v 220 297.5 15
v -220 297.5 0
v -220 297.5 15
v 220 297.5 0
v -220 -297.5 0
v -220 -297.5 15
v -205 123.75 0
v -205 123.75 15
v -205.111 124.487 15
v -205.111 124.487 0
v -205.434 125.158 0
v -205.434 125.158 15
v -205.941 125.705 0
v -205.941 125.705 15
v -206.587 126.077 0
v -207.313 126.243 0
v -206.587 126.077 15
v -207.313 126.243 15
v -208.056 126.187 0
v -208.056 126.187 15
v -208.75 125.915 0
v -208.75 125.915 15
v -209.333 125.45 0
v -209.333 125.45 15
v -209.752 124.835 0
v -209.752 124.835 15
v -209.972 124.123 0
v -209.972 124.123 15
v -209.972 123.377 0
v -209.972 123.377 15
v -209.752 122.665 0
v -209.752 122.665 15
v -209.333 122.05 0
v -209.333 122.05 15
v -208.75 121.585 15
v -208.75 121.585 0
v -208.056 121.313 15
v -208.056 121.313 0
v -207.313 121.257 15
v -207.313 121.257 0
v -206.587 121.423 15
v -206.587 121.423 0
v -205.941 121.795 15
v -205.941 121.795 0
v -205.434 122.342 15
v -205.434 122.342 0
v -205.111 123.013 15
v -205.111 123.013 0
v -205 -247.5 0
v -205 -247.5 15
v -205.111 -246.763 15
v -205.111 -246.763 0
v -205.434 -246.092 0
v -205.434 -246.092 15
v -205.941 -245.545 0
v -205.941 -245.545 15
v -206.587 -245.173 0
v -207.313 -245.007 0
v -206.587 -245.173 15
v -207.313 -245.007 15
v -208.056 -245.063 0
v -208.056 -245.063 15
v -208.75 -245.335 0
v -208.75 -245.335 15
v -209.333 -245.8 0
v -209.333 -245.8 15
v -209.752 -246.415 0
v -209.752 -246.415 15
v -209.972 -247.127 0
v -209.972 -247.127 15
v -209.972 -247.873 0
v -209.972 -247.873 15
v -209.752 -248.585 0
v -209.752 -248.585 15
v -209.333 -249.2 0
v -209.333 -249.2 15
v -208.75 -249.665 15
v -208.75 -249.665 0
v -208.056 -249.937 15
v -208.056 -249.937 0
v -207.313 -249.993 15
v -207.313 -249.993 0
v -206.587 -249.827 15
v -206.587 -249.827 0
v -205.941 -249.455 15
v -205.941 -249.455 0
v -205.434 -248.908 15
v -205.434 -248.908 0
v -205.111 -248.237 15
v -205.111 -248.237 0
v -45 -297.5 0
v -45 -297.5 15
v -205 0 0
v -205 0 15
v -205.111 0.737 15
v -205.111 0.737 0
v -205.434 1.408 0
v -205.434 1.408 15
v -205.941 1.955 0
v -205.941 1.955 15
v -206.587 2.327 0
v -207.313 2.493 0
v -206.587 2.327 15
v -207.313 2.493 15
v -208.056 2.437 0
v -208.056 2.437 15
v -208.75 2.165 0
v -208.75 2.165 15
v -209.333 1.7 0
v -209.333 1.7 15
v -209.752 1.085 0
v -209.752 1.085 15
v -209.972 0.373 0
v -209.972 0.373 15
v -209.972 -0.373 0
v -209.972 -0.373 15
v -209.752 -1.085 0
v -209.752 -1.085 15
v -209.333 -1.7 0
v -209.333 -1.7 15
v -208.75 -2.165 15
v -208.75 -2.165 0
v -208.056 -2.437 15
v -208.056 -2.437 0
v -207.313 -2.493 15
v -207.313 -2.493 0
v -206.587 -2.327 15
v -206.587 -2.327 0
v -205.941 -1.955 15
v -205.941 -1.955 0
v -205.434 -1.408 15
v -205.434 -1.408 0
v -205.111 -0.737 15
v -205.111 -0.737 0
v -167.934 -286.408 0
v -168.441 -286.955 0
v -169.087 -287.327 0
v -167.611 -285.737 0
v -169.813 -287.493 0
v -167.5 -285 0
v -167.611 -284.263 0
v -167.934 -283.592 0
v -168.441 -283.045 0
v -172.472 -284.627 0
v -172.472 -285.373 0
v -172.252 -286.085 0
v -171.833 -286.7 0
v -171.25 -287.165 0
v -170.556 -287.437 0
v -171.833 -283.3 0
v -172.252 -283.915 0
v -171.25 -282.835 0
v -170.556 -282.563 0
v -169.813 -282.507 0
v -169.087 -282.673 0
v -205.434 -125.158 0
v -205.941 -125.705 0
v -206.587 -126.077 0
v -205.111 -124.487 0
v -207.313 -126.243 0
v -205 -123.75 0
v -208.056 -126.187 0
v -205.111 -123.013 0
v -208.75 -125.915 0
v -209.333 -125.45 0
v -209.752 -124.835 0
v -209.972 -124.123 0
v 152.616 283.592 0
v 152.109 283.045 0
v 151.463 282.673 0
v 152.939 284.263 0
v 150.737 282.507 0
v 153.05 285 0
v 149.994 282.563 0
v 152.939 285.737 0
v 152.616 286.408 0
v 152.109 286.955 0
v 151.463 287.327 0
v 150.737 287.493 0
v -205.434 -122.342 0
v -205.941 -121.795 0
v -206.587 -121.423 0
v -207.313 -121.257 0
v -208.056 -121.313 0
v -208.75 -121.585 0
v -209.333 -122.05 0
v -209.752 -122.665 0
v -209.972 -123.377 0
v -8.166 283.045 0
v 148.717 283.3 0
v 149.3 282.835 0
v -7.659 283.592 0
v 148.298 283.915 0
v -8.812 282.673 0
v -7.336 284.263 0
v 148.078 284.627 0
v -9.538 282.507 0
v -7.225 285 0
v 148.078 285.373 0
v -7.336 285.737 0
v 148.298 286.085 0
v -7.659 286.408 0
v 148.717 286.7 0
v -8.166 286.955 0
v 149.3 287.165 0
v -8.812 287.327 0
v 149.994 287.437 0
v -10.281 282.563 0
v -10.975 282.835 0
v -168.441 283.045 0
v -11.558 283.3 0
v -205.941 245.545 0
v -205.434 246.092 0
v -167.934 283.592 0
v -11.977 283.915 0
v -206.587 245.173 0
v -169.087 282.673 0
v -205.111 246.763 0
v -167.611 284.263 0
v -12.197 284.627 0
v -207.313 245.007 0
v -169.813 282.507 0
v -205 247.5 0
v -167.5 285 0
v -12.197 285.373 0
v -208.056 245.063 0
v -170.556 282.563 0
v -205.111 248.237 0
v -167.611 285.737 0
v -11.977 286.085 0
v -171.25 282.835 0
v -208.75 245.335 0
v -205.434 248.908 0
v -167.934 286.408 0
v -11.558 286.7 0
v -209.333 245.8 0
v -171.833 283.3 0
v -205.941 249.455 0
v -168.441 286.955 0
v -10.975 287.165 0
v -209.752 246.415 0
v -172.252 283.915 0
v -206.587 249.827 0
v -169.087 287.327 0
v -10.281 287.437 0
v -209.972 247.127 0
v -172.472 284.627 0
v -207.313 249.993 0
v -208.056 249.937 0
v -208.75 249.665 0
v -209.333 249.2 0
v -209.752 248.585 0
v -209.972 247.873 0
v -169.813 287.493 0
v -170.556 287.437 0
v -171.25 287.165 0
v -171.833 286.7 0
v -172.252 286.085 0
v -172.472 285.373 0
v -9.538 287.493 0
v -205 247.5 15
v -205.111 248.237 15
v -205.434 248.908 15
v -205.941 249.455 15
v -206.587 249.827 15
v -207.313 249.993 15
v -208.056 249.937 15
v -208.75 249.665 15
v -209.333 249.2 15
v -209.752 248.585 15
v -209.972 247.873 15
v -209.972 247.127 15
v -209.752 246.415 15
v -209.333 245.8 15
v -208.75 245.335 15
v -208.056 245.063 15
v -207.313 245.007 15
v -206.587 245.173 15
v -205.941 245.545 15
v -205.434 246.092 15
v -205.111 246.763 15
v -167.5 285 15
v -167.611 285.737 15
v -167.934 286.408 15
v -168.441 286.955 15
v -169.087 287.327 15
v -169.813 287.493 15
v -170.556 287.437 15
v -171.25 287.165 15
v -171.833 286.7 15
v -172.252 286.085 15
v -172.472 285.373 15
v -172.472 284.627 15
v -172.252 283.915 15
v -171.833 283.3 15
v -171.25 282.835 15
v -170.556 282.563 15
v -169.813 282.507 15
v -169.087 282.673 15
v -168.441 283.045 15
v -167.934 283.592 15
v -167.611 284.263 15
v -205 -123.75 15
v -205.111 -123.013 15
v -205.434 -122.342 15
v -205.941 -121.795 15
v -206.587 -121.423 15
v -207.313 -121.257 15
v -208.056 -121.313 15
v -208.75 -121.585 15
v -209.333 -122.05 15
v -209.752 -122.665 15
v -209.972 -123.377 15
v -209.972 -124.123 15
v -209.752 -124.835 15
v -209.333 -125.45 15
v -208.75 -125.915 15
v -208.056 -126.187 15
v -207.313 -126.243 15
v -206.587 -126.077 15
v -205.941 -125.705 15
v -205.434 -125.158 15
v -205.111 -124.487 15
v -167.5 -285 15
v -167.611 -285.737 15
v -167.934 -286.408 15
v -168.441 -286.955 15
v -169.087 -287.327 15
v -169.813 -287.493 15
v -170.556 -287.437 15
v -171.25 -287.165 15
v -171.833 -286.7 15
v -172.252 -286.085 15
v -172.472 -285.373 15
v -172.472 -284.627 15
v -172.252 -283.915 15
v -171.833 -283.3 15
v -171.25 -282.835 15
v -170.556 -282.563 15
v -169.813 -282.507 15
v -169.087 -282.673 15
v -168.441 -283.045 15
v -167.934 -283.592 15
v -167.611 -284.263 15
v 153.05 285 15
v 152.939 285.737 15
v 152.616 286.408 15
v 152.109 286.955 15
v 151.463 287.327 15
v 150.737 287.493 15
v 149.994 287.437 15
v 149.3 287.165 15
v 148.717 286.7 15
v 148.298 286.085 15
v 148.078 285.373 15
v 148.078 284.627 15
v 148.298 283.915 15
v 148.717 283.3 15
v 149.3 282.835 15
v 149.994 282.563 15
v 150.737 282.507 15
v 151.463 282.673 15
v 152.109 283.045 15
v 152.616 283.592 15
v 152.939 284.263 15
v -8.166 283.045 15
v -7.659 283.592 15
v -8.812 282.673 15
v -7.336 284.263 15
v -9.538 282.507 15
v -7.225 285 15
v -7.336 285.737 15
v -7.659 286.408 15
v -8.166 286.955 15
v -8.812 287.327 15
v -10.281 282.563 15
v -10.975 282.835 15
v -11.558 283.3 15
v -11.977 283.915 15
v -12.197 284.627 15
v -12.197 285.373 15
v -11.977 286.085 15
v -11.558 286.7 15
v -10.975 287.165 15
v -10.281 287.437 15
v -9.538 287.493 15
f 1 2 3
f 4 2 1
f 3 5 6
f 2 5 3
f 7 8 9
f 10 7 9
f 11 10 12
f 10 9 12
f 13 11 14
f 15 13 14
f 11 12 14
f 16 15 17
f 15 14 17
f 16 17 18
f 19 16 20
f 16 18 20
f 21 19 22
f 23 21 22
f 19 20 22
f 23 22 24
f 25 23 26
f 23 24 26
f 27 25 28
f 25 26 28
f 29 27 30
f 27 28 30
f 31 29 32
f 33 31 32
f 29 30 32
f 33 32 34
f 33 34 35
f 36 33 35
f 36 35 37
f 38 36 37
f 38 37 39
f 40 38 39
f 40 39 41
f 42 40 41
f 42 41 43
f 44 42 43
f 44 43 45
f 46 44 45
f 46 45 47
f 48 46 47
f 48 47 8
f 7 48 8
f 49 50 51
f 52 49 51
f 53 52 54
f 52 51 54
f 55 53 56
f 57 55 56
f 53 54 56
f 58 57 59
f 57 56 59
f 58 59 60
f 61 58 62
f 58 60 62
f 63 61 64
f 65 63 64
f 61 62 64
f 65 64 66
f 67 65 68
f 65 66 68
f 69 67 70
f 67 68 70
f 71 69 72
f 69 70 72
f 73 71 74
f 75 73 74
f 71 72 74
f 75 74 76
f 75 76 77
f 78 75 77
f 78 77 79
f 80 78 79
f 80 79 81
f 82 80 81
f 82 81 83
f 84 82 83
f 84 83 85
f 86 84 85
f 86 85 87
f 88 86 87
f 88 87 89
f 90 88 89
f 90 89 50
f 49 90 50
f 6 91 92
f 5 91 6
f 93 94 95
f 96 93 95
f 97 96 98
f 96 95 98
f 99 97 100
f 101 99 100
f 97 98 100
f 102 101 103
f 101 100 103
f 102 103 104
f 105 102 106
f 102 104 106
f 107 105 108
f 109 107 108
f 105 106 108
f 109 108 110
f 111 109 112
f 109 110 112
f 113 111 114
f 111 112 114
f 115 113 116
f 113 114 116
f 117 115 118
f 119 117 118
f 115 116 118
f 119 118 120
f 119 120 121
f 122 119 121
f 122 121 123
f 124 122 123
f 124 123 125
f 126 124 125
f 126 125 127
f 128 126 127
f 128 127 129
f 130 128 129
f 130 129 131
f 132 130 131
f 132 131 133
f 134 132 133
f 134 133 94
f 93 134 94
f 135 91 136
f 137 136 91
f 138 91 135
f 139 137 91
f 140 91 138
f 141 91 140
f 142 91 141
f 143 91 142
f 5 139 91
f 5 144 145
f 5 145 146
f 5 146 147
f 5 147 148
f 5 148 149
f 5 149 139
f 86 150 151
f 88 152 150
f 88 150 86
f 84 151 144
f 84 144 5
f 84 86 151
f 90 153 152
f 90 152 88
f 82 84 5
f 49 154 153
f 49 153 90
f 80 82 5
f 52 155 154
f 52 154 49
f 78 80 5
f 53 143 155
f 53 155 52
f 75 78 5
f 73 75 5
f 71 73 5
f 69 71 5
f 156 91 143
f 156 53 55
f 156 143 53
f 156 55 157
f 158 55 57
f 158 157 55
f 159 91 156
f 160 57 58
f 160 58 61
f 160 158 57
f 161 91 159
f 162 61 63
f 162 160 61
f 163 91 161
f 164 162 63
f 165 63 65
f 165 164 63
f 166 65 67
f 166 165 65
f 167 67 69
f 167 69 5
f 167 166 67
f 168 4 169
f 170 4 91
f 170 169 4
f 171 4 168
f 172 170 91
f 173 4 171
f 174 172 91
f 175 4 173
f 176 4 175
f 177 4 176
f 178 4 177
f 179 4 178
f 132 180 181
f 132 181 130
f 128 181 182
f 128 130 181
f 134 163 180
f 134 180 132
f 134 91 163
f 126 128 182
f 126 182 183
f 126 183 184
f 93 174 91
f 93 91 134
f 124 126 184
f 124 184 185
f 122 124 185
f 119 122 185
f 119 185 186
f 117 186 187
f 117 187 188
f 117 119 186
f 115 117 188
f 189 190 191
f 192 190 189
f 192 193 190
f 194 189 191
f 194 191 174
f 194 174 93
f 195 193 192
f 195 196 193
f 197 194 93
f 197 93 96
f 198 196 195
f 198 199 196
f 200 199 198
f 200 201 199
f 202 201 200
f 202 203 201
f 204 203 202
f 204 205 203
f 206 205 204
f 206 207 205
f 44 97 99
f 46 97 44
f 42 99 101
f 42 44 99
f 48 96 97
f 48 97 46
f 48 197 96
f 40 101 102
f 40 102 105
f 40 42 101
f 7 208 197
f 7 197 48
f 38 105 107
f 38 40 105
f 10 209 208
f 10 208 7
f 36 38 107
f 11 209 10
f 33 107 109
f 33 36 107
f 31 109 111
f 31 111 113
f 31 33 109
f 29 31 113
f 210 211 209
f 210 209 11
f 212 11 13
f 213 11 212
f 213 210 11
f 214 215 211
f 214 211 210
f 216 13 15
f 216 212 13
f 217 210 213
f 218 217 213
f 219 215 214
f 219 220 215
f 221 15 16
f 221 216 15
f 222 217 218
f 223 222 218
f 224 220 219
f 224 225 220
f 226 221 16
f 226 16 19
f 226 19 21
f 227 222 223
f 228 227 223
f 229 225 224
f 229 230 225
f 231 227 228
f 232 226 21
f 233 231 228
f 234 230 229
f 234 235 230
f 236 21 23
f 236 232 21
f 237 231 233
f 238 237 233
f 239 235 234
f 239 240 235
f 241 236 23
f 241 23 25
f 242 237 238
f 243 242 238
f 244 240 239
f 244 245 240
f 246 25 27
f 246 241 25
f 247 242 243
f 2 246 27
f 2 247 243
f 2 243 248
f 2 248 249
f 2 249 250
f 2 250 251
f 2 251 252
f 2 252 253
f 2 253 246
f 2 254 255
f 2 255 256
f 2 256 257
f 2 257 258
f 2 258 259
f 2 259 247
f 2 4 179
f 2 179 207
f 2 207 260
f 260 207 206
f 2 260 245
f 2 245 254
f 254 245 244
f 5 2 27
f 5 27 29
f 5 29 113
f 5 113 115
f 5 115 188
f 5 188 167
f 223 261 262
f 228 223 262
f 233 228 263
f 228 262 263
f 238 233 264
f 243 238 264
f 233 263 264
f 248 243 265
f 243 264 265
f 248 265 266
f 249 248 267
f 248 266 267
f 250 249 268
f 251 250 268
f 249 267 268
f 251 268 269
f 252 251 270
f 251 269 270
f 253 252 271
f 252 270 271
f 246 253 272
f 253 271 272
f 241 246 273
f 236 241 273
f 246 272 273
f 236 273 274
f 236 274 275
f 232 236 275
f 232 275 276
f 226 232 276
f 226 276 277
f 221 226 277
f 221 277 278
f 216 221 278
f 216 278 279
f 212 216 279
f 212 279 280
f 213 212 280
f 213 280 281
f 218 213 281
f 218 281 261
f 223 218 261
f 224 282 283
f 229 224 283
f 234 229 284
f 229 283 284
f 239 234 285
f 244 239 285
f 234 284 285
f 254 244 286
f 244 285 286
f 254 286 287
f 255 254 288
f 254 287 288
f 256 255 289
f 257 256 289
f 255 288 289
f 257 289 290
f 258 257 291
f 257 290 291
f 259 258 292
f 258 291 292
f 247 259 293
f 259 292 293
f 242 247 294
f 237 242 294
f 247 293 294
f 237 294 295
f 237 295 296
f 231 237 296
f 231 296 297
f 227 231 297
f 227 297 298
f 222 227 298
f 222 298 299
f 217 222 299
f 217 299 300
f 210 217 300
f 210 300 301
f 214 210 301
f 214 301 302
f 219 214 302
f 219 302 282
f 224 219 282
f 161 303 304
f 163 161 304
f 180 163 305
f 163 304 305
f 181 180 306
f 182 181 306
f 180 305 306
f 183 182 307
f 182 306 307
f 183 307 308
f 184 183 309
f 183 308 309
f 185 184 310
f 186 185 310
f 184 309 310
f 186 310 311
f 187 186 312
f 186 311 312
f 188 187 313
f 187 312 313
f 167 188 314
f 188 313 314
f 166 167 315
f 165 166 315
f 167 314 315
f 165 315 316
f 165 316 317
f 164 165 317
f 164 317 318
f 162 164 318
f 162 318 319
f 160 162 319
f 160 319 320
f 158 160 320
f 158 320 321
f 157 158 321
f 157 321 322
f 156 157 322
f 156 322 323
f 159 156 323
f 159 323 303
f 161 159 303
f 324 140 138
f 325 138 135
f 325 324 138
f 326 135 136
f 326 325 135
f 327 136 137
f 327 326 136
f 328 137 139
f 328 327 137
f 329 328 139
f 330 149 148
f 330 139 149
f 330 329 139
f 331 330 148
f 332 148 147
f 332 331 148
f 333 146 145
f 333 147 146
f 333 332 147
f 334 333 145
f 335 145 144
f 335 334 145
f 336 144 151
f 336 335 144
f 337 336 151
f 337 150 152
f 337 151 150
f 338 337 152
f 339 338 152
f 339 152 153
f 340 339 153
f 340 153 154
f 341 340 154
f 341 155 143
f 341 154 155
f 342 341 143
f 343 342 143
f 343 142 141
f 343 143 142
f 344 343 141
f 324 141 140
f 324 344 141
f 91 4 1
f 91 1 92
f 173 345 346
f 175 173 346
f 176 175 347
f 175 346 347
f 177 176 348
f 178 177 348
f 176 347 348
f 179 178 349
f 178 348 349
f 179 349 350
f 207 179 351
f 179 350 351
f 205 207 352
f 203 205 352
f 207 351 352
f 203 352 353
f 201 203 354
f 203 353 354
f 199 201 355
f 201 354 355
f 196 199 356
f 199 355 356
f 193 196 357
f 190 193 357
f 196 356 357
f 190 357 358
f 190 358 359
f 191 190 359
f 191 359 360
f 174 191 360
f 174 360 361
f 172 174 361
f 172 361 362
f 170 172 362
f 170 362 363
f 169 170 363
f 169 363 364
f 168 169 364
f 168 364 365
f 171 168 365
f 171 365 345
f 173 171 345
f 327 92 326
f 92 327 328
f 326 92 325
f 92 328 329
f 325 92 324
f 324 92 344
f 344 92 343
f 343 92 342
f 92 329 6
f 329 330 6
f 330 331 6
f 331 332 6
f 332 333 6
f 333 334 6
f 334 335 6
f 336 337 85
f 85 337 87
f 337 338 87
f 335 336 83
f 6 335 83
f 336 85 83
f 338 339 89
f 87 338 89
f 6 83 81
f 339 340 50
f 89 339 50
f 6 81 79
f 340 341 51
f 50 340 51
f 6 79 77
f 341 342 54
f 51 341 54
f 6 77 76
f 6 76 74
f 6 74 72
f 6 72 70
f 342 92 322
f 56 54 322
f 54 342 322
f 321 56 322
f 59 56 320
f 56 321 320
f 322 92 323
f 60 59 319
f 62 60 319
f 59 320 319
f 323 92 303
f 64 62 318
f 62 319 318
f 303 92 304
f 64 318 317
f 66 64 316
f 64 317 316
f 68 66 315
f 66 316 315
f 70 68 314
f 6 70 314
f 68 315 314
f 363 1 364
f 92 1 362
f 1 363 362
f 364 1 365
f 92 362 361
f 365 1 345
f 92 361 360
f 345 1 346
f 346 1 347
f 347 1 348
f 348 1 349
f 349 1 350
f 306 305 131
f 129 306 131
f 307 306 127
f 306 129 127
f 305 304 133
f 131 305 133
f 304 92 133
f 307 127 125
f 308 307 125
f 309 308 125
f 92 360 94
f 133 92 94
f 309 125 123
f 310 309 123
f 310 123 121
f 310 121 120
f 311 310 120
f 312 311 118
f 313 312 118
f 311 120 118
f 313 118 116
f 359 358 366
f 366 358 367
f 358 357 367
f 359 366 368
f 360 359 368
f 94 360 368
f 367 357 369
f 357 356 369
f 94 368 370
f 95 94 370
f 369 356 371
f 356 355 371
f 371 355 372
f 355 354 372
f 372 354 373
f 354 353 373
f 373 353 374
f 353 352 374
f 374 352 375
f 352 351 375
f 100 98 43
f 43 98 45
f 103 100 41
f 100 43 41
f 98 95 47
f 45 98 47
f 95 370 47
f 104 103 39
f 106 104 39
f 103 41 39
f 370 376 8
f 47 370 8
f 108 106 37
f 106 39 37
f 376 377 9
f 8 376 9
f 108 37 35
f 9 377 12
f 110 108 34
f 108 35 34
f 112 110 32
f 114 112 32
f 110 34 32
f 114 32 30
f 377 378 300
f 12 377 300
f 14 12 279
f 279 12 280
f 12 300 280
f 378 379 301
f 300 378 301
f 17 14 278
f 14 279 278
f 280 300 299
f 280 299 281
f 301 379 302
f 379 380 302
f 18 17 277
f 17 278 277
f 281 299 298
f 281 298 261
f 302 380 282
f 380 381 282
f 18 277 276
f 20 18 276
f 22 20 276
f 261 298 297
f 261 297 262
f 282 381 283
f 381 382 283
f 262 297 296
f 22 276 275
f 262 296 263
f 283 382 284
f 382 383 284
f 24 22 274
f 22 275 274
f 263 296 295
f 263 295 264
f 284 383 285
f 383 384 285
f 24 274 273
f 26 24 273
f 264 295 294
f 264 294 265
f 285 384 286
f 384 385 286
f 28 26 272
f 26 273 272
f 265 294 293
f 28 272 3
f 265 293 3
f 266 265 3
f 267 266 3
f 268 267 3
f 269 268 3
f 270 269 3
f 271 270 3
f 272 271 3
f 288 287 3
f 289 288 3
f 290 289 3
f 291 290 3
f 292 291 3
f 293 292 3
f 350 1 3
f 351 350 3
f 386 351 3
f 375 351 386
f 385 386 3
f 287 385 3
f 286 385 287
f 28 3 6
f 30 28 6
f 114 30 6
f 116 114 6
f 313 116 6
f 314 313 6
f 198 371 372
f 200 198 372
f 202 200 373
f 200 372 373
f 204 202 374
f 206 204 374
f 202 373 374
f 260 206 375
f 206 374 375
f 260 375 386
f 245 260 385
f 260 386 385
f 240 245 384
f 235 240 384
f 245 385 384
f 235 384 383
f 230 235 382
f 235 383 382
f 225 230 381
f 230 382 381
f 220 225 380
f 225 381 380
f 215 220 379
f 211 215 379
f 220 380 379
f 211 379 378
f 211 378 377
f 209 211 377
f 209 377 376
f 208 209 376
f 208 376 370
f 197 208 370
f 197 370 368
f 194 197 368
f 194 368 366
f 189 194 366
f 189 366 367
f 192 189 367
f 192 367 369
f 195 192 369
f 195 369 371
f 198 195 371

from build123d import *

# Parameters (mm, degrees)
EXTRUDE_1_DEPTH     = 15
SKETCH_2_R          = 2.5
CUT_EXTRUDE_1_DEPTH = 371.312368143
SKETCH_2_3_R        = 2.5
CUT_EXTRUDE_2_DEPTH = 371.312368143


with BuildPart() as part:
    # ｽｹｯﾁ1 → ﾎﾞｽ - 押し出し1 (new body)
    with BuildSketch(Plane.XY):
        Polygon((-220, 297.5), (220, 297.5), (-45, -297.5), (-220, -297.5), align=None)
    extrude(amount=EXTRUDE_1_DEPTH)

    # ｽｹｯﾁ2 → ｶｯﾄ - 押し出し1 (cut, through all)
    with BuildSketch(Plane.XY.offset(15)):
        with Locations((-170, 285)):
            Circle(SKETCH_2_R)
        with Locations((-9.725, 285)):
            Circle(SKETCH_2_R)
        with Locations((150.55, 285)):
            Circle(SKETCH_2_R)
    cut_extrude_1 = extrude(amount=-CUT_EXTRUDE_1_DEPTH, mode=Mode.SUBTRACT)

    # ｽｹｯﾁ2<3> → ｶｯﾄ - 押し出し2 (cut, through all)
    with BuildSketch(Plane.XY.offset(15)):
        with Locations((-207.5, 247.5)):
            Circle(SKETCH_2_3_R)
        with Locations((-207.5, 123.75)):
            Circle(SKETCH_2_3_R)
        with Locations((-207.5, 0)):
            Circle(SKETCH_2_3_R)
        with Locations((-207.5, -123.75)):
            Circle(SKETCH_2_3_R)
        with Locations((-207.5, -247.5)):
            Circle(SKETCH_2_3_R)
    extrude(amount=-CUT_EXTRUDE_2_DEPTH, mode=Mode.SUBTRACT)

    # ﾐﾗｰ1: ｶｯﾄ - 押し出し1 across plane
    add(cut_extrude_1.mirror(Plane.ZX), mode=Mode.SUBTRACT)


solid = part.part
